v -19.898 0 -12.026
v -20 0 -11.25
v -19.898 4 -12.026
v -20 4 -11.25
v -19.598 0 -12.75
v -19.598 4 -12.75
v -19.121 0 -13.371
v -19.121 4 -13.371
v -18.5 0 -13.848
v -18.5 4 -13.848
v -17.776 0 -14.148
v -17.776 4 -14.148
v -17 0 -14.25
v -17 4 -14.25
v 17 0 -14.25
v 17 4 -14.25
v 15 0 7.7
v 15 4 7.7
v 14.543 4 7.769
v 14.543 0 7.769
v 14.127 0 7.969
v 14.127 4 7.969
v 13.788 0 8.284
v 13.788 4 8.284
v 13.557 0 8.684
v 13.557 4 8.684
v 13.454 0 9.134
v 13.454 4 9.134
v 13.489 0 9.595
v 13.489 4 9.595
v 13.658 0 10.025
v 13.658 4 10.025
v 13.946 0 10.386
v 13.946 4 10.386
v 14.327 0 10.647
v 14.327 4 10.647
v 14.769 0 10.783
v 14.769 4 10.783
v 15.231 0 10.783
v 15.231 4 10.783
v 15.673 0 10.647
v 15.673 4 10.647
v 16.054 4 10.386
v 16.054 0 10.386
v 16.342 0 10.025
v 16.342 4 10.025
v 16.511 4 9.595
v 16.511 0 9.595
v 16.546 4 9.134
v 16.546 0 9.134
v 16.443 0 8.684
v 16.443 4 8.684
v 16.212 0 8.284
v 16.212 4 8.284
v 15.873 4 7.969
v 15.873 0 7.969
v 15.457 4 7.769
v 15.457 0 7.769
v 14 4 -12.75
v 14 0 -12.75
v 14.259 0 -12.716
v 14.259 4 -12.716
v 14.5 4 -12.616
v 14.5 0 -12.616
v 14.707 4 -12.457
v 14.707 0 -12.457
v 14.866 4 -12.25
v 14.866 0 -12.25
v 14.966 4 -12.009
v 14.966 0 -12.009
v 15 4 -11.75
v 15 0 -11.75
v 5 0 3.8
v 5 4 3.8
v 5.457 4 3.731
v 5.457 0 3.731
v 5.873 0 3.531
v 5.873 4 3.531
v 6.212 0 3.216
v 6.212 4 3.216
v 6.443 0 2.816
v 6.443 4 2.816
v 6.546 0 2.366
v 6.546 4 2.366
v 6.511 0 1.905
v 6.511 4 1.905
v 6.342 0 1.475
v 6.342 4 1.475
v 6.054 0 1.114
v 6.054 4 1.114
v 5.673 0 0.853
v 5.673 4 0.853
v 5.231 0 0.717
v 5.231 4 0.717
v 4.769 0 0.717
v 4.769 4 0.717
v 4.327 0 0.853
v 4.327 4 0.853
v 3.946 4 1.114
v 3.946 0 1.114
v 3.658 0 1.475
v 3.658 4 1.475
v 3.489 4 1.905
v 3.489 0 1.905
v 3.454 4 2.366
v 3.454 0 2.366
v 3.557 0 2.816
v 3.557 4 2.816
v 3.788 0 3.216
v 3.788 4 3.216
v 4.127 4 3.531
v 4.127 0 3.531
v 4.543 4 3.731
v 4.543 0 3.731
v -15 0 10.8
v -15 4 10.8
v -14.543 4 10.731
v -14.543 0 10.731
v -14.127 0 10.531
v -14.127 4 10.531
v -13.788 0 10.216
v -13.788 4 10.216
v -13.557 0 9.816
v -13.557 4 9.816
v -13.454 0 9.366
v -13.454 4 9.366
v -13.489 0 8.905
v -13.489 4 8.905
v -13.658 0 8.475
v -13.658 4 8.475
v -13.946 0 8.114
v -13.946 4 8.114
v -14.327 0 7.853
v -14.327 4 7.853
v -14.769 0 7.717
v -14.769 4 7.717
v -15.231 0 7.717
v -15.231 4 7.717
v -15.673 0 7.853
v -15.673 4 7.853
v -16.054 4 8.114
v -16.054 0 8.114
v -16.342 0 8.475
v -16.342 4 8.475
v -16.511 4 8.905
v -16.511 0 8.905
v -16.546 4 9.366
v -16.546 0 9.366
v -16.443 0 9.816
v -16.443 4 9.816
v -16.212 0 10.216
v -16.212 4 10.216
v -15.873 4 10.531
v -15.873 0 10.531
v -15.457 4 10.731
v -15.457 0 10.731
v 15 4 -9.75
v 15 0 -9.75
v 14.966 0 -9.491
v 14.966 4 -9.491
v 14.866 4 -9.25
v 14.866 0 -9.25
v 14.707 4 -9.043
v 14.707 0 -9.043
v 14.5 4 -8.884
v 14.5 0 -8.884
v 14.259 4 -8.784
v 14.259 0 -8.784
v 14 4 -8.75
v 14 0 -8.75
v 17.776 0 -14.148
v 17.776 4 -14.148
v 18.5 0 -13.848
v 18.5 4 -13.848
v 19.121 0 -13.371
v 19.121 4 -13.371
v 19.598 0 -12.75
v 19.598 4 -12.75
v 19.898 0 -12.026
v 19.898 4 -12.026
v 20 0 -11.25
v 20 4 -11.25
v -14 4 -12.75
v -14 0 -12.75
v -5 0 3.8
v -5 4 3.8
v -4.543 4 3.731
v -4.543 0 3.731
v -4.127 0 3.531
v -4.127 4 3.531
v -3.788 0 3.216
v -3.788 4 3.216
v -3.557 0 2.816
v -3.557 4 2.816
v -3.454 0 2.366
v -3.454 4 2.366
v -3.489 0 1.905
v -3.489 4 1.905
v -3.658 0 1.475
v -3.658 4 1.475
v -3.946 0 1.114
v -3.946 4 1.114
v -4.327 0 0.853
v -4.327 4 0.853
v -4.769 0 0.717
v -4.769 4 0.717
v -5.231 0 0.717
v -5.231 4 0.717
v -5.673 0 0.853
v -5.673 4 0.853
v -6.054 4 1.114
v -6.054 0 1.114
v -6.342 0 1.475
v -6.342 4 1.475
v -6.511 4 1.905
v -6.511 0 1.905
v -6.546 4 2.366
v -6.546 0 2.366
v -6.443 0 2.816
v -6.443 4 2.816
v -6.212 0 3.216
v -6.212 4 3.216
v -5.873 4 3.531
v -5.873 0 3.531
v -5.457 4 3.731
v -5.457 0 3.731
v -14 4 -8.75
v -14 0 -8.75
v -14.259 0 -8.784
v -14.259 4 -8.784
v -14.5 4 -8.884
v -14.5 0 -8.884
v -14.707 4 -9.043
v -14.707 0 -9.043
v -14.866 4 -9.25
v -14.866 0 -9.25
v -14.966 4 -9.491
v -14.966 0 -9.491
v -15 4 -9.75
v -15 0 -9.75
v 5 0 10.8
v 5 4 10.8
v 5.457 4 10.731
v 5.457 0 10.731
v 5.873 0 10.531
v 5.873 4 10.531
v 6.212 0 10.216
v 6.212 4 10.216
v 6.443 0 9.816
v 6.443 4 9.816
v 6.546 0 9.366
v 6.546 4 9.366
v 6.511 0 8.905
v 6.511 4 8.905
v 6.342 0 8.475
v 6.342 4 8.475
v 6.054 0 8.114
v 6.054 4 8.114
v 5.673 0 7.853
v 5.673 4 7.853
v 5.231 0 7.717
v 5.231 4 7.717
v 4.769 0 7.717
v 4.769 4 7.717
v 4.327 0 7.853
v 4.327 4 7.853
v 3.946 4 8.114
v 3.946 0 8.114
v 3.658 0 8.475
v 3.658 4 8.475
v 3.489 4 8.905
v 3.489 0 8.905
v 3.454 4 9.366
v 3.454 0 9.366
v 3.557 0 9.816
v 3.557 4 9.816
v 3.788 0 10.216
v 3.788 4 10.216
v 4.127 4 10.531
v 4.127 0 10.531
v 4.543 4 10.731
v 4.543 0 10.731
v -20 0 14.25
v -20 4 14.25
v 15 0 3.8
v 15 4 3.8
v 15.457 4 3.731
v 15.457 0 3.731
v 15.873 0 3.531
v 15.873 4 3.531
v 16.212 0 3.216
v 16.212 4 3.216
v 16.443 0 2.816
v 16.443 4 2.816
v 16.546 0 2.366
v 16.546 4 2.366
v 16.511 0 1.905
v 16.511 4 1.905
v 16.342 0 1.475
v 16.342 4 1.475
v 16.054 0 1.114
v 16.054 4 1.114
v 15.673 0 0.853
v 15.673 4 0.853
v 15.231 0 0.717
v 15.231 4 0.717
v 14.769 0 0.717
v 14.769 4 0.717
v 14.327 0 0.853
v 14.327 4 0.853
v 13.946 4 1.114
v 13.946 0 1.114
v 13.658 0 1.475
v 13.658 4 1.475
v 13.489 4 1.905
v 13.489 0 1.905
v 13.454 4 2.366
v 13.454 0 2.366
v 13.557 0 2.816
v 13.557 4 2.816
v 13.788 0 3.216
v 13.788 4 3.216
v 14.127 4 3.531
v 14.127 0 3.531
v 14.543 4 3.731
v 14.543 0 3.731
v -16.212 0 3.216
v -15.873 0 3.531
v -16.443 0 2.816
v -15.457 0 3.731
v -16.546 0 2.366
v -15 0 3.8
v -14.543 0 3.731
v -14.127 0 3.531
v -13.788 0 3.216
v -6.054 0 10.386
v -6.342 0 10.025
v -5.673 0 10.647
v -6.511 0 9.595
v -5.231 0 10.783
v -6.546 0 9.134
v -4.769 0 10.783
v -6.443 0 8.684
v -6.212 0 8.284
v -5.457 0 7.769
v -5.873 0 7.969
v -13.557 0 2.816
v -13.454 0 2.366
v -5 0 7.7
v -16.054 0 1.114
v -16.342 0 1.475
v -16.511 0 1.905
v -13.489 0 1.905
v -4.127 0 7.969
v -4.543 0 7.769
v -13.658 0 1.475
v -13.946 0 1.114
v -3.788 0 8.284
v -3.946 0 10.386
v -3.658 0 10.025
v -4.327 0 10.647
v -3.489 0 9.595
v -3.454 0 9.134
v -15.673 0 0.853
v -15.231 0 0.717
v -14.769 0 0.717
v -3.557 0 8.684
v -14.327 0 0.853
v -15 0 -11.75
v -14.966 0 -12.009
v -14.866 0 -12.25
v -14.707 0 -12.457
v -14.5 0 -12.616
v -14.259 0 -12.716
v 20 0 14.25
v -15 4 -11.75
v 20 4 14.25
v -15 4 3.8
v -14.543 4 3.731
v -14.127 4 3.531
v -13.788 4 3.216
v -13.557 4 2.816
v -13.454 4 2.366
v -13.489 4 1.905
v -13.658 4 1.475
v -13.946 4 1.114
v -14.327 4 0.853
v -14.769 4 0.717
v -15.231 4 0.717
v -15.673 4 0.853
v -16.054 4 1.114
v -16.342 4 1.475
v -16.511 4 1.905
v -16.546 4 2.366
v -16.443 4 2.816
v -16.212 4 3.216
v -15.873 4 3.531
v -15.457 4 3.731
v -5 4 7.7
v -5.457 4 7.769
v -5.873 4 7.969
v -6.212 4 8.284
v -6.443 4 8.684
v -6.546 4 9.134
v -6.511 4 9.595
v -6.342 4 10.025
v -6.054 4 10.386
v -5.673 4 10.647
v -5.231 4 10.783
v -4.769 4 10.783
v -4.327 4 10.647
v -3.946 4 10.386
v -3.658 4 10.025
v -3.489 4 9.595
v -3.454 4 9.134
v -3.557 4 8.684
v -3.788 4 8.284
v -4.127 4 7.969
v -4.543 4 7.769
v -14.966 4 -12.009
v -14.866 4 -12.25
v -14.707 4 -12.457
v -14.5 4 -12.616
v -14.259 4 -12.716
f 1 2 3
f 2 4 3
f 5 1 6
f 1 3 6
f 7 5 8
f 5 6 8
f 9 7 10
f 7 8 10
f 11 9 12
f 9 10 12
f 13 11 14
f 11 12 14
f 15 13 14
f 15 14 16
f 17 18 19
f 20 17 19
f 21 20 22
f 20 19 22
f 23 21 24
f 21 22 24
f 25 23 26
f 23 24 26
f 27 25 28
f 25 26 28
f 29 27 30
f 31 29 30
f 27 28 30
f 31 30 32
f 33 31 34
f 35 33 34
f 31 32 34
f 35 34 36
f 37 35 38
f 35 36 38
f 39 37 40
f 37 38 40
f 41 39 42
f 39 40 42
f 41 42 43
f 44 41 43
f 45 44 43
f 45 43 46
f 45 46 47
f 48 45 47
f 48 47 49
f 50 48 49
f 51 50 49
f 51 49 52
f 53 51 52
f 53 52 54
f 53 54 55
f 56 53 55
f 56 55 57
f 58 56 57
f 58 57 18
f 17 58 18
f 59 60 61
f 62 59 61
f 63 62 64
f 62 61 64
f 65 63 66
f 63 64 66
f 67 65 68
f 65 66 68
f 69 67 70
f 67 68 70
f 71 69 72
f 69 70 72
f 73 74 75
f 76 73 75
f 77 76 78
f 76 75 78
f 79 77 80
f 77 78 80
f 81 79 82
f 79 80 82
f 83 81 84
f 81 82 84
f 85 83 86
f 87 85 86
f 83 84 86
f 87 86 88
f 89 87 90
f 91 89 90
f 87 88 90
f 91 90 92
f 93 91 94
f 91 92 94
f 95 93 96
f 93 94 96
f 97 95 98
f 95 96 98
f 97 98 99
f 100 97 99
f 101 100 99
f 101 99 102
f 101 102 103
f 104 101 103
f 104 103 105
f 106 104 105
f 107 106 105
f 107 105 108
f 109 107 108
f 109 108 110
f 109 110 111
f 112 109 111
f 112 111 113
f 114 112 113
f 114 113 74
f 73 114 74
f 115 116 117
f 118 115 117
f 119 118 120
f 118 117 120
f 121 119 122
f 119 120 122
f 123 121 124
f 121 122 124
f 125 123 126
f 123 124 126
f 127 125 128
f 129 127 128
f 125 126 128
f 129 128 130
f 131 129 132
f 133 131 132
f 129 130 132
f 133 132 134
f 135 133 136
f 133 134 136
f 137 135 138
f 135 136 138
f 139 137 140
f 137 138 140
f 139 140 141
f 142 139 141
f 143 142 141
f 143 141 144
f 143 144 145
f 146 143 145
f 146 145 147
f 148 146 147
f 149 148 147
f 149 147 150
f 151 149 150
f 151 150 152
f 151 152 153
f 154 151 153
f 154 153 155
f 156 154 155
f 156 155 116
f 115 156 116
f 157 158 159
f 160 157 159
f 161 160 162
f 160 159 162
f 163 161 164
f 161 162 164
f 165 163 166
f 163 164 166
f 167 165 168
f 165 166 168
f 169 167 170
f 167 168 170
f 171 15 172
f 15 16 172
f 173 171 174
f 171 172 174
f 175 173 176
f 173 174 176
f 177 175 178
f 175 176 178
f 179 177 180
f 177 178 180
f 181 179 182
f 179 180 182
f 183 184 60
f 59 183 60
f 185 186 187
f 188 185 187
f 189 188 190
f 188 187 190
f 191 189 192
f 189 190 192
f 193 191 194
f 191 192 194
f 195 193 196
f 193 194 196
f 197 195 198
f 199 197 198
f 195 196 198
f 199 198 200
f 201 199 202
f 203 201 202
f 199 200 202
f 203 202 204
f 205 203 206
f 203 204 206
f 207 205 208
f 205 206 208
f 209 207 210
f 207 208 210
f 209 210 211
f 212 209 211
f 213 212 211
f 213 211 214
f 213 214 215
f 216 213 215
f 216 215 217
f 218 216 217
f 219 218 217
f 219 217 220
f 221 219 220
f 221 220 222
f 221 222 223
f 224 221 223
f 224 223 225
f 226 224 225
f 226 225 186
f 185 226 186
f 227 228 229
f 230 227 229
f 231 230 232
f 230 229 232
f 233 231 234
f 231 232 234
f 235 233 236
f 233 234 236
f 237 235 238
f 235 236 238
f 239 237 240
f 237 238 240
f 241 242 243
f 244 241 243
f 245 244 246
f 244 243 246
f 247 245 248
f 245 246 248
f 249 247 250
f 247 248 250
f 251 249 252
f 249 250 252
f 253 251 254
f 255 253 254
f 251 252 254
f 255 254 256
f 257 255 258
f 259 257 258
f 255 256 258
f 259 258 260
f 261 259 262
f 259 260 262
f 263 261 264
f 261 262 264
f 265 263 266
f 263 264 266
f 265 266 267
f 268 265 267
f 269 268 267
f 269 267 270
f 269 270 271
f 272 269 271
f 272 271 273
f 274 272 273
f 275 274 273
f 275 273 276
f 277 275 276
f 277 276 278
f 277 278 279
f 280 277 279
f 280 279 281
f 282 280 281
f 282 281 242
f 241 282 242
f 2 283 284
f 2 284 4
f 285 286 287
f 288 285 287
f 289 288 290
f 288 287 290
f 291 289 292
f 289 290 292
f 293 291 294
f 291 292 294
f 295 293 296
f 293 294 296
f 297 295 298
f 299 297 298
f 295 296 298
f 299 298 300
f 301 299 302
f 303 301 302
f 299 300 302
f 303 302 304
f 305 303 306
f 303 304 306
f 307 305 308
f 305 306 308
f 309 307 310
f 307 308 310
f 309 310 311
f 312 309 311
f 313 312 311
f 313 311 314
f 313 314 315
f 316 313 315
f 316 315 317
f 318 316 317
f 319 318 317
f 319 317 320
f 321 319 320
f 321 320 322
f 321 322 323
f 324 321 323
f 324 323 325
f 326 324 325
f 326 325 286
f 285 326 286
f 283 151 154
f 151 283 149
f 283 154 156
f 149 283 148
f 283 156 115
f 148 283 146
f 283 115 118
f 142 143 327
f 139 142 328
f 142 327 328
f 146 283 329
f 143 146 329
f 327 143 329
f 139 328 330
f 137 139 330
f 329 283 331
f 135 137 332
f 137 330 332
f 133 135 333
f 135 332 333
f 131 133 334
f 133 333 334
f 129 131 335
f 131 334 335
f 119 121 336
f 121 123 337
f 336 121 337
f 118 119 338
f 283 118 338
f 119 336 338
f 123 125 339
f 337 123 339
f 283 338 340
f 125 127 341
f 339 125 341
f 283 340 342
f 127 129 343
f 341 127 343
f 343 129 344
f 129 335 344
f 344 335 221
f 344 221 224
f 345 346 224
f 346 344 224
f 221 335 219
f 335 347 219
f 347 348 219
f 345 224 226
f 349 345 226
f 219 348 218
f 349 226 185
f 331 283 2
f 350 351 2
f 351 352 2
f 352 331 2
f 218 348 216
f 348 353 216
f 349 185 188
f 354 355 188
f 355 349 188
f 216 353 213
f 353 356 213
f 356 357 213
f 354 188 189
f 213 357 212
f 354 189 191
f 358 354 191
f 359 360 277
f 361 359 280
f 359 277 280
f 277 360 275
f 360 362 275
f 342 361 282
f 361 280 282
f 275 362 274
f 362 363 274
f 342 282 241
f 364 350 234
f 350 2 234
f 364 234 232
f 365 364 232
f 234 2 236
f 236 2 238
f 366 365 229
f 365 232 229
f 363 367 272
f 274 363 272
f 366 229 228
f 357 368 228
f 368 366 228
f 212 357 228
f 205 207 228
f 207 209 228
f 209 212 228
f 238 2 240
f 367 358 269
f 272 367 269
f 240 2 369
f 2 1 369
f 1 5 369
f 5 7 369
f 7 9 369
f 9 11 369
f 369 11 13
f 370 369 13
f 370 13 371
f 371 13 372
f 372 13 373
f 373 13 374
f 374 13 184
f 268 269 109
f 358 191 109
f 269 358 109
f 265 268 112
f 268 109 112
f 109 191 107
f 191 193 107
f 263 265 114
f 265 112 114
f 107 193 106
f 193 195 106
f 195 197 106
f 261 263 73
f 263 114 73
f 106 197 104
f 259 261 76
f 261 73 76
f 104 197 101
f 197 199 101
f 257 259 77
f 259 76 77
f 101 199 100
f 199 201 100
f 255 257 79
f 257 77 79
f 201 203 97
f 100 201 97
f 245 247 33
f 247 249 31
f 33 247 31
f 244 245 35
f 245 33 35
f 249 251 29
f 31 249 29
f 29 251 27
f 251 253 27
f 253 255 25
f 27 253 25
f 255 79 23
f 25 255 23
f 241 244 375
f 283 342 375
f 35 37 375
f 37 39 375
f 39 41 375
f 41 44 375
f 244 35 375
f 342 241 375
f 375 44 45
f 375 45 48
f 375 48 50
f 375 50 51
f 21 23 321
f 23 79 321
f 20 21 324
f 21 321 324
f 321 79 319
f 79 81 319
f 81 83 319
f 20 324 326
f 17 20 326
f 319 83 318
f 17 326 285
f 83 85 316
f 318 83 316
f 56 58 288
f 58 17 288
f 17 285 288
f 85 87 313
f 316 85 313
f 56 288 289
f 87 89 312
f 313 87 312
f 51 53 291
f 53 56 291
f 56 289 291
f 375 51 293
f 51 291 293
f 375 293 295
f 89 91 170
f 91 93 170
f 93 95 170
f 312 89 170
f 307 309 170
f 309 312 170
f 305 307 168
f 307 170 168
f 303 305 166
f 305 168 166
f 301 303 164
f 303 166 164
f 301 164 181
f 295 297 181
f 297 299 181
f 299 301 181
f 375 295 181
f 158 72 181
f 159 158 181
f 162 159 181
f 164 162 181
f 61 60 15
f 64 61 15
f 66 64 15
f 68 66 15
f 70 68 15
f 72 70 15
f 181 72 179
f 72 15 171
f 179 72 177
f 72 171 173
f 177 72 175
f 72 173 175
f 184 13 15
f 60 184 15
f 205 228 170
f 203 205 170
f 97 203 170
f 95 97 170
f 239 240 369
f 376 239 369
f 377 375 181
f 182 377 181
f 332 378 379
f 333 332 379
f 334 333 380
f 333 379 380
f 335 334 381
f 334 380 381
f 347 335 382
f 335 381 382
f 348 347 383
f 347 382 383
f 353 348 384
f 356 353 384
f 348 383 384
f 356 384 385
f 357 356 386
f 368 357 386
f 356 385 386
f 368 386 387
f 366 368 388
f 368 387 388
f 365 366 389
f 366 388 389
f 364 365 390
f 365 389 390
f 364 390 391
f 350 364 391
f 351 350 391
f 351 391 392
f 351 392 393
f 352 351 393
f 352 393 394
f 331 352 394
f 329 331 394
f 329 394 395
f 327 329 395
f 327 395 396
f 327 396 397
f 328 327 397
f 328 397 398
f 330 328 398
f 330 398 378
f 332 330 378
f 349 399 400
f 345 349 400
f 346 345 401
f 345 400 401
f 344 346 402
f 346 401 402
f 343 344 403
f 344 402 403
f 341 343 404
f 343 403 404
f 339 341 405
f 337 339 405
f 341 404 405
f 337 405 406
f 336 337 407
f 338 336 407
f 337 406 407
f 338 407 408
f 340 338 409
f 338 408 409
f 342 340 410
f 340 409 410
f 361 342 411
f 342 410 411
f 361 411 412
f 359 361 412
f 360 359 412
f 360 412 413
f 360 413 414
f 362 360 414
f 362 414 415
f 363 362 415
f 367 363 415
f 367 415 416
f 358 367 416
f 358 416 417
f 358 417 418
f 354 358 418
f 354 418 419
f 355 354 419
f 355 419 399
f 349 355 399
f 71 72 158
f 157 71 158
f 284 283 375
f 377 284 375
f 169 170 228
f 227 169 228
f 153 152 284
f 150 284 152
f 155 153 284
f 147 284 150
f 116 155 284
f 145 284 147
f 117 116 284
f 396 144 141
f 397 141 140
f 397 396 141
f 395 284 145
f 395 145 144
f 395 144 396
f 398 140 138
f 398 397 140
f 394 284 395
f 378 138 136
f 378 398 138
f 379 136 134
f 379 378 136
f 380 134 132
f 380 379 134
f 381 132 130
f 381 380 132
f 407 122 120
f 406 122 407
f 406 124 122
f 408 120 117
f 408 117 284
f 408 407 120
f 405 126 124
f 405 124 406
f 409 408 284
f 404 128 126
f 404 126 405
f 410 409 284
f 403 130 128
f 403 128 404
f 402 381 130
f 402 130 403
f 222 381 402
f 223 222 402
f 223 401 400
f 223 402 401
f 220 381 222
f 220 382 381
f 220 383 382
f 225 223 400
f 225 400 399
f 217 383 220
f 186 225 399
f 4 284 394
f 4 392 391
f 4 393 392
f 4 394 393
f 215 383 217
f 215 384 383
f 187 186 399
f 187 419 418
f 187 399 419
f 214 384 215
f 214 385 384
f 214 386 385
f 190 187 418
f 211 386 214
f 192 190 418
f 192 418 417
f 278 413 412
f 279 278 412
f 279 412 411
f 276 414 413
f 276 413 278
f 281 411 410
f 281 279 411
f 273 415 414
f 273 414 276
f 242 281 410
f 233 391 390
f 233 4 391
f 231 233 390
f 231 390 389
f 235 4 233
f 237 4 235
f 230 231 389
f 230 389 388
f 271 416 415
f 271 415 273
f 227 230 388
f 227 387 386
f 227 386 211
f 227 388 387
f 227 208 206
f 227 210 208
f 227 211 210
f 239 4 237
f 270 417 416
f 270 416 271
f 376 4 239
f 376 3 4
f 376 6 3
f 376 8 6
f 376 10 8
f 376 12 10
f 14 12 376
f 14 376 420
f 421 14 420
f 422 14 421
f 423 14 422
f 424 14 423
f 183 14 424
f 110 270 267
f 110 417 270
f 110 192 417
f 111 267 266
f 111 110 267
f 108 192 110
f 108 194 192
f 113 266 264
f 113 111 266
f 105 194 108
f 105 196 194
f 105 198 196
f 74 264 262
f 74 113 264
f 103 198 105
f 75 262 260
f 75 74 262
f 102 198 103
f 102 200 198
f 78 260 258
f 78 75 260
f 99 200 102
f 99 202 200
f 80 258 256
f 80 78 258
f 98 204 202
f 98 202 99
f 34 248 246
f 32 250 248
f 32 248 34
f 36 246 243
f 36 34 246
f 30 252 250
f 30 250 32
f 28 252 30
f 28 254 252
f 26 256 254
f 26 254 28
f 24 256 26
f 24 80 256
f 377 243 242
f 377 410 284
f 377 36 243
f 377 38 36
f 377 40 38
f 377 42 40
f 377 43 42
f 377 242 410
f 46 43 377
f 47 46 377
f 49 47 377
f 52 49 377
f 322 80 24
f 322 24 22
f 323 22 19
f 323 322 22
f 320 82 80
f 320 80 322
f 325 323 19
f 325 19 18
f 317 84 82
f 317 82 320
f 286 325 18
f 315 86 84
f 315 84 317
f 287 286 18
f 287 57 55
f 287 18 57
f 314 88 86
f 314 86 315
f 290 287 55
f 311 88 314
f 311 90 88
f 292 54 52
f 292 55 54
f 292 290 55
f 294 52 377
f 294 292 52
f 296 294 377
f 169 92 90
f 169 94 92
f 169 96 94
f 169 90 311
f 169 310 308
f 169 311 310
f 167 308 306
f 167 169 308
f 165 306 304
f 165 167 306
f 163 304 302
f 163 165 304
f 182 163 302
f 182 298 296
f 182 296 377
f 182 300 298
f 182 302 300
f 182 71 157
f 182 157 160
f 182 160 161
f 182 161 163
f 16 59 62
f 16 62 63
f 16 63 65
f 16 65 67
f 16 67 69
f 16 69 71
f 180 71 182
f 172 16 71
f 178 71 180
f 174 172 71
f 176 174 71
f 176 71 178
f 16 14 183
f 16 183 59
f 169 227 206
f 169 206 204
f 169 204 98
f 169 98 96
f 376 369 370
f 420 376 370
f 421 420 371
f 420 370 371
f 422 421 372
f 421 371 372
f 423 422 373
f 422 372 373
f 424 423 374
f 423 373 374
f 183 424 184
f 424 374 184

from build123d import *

# Parameters (mm, degrees)
SKETCH_1_W          = 40
SKETCH_1_H          = 28.5
EXTRUDE_1_DEPTH     = 4
SKETCH_2_R          = 1.55
CUT_EXTRUDE_1_DEPTH = 25.880966621
SKETCH_3_R          = 1.55
CUT_EXTRUDE_2_DEPTH = 25.880966621
FILLET_1_R          = 3


with BuildPart() as part:
    # 草图1 → 凸台-拉伸1 (new body)
    with BuildSketch(Plane(origin=(0, 0, 0), x_dir=(1, 0, 0), z_dir=(0, 1, 0))):
        Rectangle(SKETCH_1_W, SKETCH_1_H)
        with BuildLine():
            Line((-14, 12.75), (14, 12.75))
            ThreePointArc((14, 12.75), (14.707106781, 12.457106781), (15, 11.75))
            Line((15, 11.75), (15, 9.75))
            ThreePointArc((15, 9.75), (14.707106781, 9.042893219), (14, 8.75))
            Line((14, 8.75), (-14, 8.75))
            ThreePointArc((-14, 8.75), (-14.707106781, 9.042893219), (-15, 9.75))
            Line((-15, 9.75), (-15, 11.75))
            ThreePointArc((-15, 11.75), (-14.707106781, 12.457106781), (-14, 12.75))
        make_face(mode=Mode.SUBTRACT)
    extrude(amount=EXTRUDE_1_DEPTH)

    # 草图2 → 切除-拉伸1 (cut, through all)
    with BuildSketch(Plane(origin=(0, 4, 0), x_dir=(1, 0, 0), z_dir=(0, 1, 0))):
        with Locations(Location((-15, -9.25, 0), (0, 0, 270))):
            Circle(SKETCH_2_R)
        with Locations(Location((5, -9.25, 0), (0, 0, 270))):
            Circle(SKETCH_2_R)
        with Locations(Location((15, -9.25, 0), (0, 0, 90))):
            Circle(SKETCH_2_R)
        with Locations(Location((-5, -9.25, 0), (0, 0, 90))):
            Circle(SKETCH_2_R)
    extrude(amount=-CUT_EXTRUDE_1_DEPTH, mode=Mode.SUBTRACT)

    # 草图3 → 切除-拉伸2 (cut, through all)
    with BuildSketch(Plane(origin=(0, 4, 0), x_dir=(1, 0, 0), z_dir=(0, 1, 0))):
        with Locations(Location((-15, -2.25, 0), (0, 0, 270))):
            Circle(SKETCH_3_R)
        with Locations(Location((-5, -2.25, 0), (0, 0, 270))):
            Circle(SKETCH_3_R)
        with Locations(Location((5, -2.25, 0), (0, 0, 270))):
            Circle(SKETCH_3_R)
        with Locations(Location((15, -2.25, 0), (0, 0, 270))):
            Circle(SKETCH_3_R)
    extrude(amount=-CUT_EXTRUDE_2_DEPTH, mode=Mode.SUBTRACT)

    # 圆角1
    fillet_1_edges = [part.edges().sort_by_distance(p)[0] for p in [
        (-20, 2, -14.25),
        (20, 2, -14.25),
    ]]
    fillet(fillet_1_edges, radius=FILLET_1_R)


solid = part.part
